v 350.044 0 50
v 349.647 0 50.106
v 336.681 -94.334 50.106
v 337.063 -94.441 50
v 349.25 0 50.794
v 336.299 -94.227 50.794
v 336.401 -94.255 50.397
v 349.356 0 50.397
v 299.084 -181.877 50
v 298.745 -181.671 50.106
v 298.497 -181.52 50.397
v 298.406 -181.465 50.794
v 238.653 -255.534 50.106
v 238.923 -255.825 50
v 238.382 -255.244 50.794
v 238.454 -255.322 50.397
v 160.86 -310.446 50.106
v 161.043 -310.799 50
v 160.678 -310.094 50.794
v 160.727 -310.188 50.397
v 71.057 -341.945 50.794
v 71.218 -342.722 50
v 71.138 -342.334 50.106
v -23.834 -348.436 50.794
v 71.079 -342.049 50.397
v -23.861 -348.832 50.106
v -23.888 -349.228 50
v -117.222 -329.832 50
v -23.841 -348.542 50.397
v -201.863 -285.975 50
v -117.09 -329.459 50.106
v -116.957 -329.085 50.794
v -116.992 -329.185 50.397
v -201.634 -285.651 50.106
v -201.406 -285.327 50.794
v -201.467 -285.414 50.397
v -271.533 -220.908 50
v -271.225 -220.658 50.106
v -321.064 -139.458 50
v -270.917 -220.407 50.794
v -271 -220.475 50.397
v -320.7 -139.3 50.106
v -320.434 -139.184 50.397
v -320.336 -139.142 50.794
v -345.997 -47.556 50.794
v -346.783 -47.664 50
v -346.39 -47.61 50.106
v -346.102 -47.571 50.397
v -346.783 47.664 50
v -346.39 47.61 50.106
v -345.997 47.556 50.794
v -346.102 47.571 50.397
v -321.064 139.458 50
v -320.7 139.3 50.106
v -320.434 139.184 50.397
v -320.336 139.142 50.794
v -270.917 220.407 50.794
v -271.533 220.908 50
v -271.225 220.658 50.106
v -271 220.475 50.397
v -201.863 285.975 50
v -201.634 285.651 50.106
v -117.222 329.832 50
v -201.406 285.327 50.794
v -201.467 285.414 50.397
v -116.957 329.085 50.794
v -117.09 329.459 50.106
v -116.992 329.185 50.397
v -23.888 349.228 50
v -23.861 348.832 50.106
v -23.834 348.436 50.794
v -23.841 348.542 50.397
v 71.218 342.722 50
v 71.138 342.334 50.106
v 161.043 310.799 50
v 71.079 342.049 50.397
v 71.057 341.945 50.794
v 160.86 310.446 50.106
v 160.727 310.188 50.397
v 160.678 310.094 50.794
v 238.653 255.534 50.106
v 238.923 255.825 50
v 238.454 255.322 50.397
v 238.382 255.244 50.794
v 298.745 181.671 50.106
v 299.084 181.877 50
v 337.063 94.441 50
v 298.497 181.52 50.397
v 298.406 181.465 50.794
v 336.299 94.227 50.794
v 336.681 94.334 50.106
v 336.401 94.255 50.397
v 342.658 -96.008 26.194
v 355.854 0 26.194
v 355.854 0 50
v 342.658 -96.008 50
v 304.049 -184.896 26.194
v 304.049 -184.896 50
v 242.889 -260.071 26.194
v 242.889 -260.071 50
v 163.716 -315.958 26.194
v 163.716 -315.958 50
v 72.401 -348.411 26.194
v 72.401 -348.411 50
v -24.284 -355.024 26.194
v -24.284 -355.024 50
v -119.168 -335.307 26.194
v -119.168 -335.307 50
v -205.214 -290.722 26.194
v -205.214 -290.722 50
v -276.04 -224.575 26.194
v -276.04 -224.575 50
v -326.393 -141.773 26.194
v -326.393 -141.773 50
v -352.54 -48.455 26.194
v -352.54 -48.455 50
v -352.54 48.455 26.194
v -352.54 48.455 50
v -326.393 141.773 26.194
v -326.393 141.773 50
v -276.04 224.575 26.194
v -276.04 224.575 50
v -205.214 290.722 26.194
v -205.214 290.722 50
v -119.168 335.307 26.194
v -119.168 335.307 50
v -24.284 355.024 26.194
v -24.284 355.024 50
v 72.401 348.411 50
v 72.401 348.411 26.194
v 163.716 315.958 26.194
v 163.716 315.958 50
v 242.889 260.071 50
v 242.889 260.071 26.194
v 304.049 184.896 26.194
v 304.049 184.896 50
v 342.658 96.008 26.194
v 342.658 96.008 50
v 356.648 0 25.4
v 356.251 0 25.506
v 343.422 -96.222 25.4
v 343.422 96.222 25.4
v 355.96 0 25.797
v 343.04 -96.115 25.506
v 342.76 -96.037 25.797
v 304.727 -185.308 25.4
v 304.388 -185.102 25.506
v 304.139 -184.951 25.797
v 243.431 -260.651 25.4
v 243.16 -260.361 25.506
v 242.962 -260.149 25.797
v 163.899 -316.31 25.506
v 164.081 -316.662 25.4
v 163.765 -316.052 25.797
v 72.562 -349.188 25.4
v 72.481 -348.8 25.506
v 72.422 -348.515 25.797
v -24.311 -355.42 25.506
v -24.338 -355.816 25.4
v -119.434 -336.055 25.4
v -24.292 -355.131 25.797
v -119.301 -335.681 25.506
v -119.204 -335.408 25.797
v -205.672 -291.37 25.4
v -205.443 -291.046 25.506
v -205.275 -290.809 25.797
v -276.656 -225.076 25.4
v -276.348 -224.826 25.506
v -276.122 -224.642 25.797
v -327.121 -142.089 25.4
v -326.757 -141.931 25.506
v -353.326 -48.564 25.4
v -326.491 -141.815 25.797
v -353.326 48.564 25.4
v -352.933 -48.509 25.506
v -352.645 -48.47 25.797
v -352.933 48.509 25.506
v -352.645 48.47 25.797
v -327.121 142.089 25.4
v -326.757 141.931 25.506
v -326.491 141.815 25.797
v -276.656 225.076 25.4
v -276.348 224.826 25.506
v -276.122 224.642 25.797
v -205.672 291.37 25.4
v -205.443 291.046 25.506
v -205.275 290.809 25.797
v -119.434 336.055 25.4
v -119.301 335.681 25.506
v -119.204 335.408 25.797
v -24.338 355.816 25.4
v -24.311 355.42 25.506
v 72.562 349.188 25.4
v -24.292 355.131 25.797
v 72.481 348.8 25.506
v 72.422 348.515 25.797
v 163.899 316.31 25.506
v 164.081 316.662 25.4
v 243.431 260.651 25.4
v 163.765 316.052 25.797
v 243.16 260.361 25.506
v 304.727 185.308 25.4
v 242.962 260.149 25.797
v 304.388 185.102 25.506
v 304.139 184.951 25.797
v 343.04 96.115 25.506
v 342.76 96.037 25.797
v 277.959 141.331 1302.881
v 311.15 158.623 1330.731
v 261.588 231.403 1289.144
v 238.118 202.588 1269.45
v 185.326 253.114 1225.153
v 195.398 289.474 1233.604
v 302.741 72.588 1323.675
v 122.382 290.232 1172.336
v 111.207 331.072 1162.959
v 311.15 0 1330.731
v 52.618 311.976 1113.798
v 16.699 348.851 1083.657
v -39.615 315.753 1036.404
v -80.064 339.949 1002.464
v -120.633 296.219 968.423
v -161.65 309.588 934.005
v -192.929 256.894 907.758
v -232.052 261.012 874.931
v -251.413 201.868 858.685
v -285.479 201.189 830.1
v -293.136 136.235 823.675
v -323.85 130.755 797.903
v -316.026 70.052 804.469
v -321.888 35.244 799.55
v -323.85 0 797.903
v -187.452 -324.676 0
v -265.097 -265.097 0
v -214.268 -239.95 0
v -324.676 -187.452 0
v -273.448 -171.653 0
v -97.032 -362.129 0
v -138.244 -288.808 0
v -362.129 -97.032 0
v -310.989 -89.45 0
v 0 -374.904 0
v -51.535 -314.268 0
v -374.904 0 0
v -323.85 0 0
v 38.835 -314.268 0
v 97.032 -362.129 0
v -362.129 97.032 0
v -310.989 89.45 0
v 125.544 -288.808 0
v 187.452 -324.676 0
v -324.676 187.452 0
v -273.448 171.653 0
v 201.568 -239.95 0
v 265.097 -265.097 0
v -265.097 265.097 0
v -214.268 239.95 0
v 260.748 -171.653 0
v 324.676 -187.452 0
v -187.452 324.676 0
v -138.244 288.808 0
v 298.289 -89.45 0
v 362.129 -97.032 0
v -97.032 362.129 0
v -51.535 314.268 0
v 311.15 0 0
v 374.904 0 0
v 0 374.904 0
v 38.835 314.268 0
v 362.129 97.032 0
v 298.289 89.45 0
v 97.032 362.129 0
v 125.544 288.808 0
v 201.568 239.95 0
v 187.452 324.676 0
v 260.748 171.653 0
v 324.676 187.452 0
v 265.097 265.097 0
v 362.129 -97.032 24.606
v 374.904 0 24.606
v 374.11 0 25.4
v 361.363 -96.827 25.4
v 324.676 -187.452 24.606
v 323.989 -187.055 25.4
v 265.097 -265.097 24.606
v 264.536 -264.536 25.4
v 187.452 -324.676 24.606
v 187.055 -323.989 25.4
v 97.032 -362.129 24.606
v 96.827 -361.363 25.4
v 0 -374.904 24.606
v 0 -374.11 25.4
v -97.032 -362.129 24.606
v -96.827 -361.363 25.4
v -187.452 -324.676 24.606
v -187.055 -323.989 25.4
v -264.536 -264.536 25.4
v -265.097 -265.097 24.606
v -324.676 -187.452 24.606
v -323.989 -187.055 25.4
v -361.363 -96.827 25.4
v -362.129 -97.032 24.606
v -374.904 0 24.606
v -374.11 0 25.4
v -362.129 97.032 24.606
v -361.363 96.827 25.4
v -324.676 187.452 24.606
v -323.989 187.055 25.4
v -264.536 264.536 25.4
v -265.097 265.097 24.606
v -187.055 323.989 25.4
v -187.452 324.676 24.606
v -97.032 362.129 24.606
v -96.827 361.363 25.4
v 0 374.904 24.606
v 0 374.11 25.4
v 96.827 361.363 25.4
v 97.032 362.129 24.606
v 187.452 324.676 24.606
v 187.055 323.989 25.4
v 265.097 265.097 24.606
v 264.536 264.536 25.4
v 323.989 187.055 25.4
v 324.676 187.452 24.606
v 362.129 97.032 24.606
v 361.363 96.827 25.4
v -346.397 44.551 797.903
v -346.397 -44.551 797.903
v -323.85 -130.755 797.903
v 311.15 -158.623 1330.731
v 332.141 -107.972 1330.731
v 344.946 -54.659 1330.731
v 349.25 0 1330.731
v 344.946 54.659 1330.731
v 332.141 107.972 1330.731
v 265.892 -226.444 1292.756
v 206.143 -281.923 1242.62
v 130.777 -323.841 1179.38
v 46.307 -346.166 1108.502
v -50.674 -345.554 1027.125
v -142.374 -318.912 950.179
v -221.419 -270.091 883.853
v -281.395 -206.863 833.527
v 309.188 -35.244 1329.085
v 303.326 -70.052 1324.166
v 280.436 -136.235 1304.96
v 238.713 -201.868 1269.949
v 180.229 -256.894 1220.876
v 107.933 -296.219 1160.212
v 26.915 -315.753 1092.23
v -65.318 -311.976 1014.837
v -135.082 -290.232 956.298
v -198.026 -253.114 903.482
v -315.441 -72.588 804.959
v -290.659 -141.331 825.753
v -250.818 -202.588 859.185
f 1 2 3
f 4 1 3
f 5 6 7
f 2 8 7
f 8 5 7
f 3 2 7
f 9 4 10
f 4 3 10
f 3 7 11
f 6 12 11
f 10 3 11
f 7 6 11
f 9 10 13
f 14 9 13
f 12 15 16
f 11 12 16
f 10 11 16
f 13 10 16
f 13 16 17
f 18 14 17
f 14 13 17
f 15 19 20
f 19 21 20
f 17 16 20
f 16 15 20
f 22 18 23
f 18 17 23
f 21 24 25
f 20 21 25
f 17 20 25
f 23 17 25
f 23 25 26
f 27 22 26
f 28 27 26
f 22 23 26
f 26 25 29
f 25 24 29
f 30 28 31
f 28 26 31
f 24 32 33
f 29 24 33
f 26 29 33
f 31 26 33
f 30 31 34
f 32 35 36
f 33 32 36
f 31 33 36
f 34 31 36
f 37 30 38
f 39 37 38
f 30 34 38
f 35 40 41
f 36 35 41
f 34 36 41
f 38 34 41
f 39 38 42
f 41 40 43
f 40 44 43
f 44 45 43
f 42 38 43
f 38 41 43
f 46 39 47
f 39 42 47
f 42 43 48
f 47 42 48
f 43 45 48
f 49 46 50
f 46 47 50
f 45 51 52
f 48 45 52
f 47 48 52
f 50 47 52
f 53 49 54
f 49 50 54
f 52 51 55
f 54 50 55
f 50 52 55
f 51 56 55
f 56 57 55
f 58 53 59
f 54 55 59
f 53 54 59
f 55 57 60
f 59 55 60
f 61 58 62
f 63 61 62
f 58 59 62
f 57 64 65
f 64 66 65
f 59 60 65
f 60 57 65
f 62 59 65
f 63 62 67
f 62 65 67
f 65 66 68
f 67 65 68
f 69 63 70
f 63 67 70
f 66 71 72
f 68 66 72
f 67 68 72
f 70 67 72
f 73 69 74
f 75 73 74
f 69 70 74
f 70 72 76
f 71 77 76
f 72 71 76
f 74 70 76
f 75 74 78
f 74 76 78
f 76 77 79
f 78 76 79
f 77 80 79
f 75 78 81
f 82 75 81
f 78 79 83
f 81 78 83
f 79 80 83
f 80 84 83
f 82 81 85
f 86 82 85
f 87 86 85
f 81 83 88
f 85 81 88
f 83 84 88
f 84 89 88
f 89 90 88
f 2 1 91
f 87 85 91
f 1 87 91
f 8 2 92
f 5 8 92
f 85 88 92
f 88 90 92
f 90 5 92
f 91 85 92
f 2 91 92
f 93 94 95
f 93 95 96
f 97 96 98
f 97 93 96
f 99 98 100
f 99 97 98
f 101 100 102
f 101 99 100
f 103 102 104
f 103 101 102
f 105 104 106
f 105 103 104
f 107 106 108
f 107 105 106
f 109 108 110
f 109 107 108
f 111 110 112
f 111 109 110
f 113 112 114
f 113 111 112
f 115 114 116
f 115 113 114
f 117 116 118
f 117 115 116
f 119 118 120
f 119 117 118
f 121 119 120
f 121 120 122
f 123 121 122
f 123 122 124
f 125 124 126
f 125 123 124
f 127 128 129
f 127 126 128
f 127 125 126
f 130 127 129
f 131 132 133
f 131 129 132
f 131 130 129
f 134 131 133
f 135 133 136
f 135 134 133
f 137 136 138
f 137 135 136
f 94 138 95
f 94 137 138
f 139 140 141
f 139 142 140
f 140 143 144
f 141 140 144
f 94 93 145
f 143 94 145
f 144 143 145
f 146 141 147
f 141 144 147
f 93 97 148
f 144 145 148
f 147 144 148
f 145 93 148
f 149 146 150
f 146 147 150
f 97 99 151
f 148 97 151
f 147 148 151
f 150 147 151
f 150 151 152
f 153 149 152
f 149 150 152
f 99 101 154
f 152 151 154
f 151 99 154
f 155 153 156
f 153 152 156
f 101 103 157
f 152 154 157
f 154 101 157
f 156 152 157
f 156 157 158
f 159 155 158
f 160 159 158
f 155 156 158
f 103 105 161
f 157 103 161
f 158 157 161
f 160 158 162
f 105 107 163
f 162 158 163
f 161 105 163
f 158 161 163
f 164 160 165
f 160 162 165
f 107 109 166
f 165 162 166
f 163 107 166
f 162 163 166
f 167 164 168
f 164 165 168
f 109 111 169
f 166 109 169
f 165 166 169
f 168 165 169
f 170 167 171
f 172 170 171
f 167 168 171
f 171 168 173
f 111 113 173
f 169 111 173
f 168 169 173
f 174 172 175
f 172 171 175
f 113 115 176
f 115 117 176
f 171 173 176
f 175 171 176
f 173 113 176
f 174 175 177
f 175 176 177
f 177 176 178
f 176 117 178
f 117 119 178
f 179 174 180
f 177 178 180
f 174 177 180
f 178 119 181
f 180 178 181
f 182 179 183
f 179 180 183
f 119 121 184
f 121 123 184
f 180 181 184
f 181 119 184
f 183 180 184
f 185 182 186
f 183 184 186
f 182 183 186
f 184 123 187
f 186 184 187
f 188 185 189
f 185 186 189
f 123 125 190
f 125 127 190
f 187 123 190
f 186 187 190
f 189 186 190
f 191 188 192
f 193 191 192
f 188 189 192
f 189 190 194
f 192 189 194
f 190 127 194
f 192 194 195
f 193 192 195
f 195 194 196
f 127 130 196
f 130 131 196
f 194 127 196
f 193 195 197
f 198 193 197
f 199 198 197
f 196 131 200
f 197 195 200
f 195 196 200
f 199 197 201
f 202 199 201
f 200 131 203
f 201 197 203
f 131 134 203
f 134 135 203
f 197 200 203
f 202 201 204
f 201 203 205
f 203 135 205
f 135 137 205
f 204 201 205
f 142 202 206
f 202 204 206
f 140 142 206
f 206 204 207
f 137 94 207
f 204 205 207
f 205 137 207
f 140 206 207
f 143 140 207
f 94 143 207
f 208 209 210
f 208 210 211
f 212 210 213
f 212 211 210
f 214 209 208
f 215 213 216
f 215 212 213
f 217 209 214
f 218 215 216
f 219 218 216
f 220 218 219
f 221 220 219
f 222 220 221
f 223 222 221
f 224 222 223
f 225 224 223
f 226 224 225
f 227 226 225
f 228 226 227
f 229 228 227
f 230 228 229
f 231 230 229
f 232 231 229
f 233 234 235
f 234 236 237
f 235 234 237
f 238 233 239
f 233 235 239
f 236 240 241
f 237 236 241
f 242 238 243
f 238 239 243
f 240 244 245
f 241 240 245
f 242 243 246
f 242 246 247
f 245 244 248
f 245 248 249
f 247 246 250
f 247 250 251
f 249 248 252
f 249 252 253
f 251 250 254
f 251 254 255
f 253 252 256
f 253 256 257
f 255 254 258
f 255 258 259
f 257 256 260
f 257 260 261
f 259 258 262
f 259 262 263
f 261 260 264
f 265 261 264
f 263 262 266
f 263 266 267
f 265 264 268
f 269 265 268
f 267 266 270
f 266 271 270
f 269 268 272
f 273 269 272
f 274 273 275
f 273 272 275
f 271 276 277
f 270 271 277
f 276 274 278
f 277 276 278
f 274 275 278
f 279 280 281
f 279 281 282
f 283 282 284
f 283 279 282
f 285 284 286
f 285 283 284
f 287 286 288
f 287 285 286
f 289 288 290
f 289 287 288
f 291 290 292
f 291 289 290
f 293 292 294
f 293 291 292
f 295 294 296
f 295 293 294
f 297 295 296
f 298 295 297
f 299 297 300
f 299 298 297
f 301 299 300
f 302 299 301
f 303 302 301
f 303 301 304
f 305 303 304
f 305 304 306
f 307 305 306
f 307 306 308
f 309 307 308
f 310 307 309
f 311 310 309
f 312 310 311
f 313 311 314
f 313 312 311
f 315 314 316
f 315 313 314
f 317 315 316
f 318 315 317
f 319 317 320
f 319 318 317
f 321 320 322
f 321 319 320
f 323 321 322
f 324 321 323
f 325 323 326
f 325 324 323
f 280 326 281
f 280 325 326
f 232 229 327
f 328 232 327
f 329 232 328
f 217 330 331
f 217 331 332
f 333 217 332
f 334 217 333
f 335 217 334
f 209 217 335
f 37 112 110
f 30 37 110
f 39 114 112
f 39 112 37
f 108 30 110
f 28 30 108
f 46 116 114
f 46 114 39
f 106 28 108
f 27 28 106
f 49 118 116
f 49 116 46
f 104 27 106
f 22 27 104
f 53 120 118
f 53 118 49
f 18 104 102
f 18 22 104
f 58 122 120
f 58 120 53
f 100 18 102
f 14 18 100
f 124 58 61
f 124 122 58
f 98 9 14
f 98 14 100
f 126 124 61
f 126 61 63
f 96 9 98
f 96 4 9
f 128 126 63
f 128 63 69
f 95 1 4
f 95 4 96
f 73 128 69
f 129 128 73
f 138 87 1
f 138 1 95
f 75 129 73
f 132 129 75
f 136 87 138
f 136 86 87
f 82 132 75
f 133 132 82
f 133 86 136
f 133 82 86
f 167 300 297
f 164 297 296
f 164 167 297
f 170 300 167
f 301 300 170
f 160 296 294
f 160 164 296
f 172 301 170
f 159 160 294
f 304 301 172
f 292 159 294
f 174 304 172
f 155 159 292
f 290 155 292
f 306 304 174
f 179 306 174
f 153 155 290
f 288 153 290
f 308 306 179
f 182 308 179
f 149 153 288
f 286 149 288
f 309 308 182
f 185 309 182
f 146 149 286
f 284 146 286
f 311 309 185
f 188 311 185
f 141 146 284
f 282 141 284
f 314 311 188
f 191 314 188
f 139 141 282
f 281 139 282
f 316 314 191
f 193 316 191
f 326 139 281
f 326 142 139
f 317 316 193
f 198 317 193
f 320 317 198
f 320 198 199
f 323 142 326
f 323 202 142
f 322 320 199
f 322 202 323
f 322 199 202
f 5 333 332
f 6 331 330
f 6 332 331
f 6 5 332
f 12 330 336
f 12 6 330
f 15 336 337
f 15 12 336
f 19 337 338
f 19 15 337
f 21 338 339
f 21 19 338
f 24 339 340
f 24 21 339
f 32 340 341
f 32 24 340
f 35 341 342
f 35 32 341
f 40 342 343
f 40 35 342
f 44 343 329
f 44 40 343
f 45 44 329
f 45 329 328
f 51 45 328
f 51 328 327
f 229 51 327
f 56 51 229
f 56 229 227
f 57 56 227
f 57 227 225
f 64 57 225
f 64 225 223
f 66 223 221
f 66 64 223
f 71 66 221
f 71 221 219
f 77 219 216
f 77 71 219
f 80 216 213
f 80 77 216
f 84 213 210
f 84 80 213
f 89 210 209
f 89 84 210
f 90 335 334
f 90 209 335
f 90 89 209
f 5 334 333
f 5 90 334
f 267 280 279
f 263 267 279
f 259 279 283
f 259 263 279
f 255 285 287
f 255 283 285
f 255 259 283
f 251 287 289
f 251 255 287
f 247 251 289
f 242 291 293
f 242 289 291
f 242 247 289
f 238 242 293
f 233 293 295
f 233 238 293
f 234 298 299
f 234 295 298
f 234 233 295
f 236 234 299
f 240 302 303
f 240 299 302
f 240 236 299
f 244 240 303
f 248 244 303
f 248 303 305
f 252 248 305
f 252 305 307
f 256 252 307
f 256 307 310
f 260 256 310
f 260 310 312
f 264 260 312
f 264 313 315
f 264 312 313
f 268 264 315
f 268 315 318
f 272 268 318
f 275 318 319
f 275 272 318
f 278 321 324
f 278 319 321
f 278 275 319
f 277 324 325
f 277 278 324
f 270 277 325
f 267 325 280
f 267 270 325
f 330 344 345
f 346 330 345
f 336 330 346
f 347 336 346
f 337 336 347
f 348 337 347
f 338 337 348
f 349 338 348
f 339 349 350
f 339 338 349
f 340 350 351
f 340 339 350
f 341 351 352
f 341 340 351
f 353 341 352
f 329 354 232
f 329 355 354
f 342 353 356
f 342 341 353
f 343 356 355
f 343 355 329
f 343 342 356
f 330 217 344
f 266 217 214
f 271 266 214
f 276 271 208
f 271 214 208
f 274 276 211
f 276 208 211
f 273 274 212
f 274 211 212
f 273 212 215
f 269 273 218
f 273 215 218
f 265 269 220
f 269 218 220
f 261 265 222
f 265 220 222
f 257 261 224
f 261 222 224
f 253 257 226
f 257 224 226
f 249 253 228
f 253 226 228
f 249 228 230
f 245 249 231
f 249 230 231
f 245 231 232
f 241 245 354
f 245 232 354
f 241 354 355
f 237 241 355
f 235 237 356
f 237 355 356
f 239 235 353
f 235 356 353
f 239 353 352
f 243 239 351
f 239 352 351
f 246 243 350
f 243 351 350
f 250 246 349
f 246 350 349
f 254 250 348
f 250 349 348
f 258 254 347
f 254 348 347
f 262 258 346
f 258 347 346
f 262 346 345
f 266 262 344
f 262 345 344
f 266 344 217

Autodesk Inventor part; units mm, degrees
ref_plane "YZ Plane" through (0, 0, 0) normal (1, 0, 0) x (0, 1, 0)
ref_plane "XZ Plane" through (0, 0, 0) normal (0, 1, 0) x (-1, 0, 0)
ref_plane "XY Plane" through (0, 0, 0) normal (0, 0, 1) x (1, 0, 0)
sketch "Sketch1" plane through (0, 0, 0) normal (0, 0, 1) x (1, 0, 0)
  circle A0 centre (0, 0) radius 374.904
  dimension "d0" = 749.808
extrude "Extrusion1" add sketch "Sketch1" along normal blind 25.4
sketch "Sketch2" plane through (0, 0, 0) normal (0, 0, 1) x (1, 0, 0)
  circle A0 centre (0, 0) radius 355.854
  dimension "d3" = 711.708
extrude "Extrusion2" add sketch "Sketch2" along normal blind 50
sketch "Sketch3" plane through (0, 0, 0) normal (0, 0, 1) x (1, 0, 0)
  circle A0 centre (0, 0) radius 349.25
  dimension "d6" = 698.5
extrude "Extrusion3" add sketch "Sketch3" along normal blind 1330.7314
sketch "Sketch4" plane through (0, 0, 1330.7314) normal (0, 0, 1) x (1, 0, 0)
  circle A0 centre (-6.35, 0) radius 317.5
  point P0 (0, 0)
  dimension "d9" = 635
  dimension "d21" = 6.35
extrude "Extrusion4" cut sketch "Sketch4" against normal through all
chamfer "Chamfer1" distance 0.7937 angle 45 1 edges at (-374.904, 0, 25.4)
fillet "Fillet1" radius 0.7937 1 edges at (-355.854, 0, 25.4)
fillet "Fillet2" radius 0.7937 1 edges at (-349.25, 0, 50)
sketch "Sketch5" plane through (0, 0, 0) normal (0, 1, 0) x (-1, 0, 0)
  line L0 (-311.15, 1330.7314) -> (323.85, 1330.7314) projected
  line L1 (-311.15, 1330.7314) -> (323.85, 797.9031)
  line L2 (323.85, 797.9031) -> (349.25, 797.9031)
  line L3 (349.25, 797.9031) -> (349.25, 1330.7314)
  line L4 (349.25, 1330.7314) -> (323.85, 1330.7314)
  line L5 (349.25, 50.7937) -> (349.25, 1330.7314) construction
  point P0 (0, 0)
  dimension "d18" = 40
extrude "Extrusion5" cut sketch "Sketch5" along normal through all both and the other way through all
properties part number "A1-19010-200-02 HCWI nozzle insert" material "Iron, Cast"
